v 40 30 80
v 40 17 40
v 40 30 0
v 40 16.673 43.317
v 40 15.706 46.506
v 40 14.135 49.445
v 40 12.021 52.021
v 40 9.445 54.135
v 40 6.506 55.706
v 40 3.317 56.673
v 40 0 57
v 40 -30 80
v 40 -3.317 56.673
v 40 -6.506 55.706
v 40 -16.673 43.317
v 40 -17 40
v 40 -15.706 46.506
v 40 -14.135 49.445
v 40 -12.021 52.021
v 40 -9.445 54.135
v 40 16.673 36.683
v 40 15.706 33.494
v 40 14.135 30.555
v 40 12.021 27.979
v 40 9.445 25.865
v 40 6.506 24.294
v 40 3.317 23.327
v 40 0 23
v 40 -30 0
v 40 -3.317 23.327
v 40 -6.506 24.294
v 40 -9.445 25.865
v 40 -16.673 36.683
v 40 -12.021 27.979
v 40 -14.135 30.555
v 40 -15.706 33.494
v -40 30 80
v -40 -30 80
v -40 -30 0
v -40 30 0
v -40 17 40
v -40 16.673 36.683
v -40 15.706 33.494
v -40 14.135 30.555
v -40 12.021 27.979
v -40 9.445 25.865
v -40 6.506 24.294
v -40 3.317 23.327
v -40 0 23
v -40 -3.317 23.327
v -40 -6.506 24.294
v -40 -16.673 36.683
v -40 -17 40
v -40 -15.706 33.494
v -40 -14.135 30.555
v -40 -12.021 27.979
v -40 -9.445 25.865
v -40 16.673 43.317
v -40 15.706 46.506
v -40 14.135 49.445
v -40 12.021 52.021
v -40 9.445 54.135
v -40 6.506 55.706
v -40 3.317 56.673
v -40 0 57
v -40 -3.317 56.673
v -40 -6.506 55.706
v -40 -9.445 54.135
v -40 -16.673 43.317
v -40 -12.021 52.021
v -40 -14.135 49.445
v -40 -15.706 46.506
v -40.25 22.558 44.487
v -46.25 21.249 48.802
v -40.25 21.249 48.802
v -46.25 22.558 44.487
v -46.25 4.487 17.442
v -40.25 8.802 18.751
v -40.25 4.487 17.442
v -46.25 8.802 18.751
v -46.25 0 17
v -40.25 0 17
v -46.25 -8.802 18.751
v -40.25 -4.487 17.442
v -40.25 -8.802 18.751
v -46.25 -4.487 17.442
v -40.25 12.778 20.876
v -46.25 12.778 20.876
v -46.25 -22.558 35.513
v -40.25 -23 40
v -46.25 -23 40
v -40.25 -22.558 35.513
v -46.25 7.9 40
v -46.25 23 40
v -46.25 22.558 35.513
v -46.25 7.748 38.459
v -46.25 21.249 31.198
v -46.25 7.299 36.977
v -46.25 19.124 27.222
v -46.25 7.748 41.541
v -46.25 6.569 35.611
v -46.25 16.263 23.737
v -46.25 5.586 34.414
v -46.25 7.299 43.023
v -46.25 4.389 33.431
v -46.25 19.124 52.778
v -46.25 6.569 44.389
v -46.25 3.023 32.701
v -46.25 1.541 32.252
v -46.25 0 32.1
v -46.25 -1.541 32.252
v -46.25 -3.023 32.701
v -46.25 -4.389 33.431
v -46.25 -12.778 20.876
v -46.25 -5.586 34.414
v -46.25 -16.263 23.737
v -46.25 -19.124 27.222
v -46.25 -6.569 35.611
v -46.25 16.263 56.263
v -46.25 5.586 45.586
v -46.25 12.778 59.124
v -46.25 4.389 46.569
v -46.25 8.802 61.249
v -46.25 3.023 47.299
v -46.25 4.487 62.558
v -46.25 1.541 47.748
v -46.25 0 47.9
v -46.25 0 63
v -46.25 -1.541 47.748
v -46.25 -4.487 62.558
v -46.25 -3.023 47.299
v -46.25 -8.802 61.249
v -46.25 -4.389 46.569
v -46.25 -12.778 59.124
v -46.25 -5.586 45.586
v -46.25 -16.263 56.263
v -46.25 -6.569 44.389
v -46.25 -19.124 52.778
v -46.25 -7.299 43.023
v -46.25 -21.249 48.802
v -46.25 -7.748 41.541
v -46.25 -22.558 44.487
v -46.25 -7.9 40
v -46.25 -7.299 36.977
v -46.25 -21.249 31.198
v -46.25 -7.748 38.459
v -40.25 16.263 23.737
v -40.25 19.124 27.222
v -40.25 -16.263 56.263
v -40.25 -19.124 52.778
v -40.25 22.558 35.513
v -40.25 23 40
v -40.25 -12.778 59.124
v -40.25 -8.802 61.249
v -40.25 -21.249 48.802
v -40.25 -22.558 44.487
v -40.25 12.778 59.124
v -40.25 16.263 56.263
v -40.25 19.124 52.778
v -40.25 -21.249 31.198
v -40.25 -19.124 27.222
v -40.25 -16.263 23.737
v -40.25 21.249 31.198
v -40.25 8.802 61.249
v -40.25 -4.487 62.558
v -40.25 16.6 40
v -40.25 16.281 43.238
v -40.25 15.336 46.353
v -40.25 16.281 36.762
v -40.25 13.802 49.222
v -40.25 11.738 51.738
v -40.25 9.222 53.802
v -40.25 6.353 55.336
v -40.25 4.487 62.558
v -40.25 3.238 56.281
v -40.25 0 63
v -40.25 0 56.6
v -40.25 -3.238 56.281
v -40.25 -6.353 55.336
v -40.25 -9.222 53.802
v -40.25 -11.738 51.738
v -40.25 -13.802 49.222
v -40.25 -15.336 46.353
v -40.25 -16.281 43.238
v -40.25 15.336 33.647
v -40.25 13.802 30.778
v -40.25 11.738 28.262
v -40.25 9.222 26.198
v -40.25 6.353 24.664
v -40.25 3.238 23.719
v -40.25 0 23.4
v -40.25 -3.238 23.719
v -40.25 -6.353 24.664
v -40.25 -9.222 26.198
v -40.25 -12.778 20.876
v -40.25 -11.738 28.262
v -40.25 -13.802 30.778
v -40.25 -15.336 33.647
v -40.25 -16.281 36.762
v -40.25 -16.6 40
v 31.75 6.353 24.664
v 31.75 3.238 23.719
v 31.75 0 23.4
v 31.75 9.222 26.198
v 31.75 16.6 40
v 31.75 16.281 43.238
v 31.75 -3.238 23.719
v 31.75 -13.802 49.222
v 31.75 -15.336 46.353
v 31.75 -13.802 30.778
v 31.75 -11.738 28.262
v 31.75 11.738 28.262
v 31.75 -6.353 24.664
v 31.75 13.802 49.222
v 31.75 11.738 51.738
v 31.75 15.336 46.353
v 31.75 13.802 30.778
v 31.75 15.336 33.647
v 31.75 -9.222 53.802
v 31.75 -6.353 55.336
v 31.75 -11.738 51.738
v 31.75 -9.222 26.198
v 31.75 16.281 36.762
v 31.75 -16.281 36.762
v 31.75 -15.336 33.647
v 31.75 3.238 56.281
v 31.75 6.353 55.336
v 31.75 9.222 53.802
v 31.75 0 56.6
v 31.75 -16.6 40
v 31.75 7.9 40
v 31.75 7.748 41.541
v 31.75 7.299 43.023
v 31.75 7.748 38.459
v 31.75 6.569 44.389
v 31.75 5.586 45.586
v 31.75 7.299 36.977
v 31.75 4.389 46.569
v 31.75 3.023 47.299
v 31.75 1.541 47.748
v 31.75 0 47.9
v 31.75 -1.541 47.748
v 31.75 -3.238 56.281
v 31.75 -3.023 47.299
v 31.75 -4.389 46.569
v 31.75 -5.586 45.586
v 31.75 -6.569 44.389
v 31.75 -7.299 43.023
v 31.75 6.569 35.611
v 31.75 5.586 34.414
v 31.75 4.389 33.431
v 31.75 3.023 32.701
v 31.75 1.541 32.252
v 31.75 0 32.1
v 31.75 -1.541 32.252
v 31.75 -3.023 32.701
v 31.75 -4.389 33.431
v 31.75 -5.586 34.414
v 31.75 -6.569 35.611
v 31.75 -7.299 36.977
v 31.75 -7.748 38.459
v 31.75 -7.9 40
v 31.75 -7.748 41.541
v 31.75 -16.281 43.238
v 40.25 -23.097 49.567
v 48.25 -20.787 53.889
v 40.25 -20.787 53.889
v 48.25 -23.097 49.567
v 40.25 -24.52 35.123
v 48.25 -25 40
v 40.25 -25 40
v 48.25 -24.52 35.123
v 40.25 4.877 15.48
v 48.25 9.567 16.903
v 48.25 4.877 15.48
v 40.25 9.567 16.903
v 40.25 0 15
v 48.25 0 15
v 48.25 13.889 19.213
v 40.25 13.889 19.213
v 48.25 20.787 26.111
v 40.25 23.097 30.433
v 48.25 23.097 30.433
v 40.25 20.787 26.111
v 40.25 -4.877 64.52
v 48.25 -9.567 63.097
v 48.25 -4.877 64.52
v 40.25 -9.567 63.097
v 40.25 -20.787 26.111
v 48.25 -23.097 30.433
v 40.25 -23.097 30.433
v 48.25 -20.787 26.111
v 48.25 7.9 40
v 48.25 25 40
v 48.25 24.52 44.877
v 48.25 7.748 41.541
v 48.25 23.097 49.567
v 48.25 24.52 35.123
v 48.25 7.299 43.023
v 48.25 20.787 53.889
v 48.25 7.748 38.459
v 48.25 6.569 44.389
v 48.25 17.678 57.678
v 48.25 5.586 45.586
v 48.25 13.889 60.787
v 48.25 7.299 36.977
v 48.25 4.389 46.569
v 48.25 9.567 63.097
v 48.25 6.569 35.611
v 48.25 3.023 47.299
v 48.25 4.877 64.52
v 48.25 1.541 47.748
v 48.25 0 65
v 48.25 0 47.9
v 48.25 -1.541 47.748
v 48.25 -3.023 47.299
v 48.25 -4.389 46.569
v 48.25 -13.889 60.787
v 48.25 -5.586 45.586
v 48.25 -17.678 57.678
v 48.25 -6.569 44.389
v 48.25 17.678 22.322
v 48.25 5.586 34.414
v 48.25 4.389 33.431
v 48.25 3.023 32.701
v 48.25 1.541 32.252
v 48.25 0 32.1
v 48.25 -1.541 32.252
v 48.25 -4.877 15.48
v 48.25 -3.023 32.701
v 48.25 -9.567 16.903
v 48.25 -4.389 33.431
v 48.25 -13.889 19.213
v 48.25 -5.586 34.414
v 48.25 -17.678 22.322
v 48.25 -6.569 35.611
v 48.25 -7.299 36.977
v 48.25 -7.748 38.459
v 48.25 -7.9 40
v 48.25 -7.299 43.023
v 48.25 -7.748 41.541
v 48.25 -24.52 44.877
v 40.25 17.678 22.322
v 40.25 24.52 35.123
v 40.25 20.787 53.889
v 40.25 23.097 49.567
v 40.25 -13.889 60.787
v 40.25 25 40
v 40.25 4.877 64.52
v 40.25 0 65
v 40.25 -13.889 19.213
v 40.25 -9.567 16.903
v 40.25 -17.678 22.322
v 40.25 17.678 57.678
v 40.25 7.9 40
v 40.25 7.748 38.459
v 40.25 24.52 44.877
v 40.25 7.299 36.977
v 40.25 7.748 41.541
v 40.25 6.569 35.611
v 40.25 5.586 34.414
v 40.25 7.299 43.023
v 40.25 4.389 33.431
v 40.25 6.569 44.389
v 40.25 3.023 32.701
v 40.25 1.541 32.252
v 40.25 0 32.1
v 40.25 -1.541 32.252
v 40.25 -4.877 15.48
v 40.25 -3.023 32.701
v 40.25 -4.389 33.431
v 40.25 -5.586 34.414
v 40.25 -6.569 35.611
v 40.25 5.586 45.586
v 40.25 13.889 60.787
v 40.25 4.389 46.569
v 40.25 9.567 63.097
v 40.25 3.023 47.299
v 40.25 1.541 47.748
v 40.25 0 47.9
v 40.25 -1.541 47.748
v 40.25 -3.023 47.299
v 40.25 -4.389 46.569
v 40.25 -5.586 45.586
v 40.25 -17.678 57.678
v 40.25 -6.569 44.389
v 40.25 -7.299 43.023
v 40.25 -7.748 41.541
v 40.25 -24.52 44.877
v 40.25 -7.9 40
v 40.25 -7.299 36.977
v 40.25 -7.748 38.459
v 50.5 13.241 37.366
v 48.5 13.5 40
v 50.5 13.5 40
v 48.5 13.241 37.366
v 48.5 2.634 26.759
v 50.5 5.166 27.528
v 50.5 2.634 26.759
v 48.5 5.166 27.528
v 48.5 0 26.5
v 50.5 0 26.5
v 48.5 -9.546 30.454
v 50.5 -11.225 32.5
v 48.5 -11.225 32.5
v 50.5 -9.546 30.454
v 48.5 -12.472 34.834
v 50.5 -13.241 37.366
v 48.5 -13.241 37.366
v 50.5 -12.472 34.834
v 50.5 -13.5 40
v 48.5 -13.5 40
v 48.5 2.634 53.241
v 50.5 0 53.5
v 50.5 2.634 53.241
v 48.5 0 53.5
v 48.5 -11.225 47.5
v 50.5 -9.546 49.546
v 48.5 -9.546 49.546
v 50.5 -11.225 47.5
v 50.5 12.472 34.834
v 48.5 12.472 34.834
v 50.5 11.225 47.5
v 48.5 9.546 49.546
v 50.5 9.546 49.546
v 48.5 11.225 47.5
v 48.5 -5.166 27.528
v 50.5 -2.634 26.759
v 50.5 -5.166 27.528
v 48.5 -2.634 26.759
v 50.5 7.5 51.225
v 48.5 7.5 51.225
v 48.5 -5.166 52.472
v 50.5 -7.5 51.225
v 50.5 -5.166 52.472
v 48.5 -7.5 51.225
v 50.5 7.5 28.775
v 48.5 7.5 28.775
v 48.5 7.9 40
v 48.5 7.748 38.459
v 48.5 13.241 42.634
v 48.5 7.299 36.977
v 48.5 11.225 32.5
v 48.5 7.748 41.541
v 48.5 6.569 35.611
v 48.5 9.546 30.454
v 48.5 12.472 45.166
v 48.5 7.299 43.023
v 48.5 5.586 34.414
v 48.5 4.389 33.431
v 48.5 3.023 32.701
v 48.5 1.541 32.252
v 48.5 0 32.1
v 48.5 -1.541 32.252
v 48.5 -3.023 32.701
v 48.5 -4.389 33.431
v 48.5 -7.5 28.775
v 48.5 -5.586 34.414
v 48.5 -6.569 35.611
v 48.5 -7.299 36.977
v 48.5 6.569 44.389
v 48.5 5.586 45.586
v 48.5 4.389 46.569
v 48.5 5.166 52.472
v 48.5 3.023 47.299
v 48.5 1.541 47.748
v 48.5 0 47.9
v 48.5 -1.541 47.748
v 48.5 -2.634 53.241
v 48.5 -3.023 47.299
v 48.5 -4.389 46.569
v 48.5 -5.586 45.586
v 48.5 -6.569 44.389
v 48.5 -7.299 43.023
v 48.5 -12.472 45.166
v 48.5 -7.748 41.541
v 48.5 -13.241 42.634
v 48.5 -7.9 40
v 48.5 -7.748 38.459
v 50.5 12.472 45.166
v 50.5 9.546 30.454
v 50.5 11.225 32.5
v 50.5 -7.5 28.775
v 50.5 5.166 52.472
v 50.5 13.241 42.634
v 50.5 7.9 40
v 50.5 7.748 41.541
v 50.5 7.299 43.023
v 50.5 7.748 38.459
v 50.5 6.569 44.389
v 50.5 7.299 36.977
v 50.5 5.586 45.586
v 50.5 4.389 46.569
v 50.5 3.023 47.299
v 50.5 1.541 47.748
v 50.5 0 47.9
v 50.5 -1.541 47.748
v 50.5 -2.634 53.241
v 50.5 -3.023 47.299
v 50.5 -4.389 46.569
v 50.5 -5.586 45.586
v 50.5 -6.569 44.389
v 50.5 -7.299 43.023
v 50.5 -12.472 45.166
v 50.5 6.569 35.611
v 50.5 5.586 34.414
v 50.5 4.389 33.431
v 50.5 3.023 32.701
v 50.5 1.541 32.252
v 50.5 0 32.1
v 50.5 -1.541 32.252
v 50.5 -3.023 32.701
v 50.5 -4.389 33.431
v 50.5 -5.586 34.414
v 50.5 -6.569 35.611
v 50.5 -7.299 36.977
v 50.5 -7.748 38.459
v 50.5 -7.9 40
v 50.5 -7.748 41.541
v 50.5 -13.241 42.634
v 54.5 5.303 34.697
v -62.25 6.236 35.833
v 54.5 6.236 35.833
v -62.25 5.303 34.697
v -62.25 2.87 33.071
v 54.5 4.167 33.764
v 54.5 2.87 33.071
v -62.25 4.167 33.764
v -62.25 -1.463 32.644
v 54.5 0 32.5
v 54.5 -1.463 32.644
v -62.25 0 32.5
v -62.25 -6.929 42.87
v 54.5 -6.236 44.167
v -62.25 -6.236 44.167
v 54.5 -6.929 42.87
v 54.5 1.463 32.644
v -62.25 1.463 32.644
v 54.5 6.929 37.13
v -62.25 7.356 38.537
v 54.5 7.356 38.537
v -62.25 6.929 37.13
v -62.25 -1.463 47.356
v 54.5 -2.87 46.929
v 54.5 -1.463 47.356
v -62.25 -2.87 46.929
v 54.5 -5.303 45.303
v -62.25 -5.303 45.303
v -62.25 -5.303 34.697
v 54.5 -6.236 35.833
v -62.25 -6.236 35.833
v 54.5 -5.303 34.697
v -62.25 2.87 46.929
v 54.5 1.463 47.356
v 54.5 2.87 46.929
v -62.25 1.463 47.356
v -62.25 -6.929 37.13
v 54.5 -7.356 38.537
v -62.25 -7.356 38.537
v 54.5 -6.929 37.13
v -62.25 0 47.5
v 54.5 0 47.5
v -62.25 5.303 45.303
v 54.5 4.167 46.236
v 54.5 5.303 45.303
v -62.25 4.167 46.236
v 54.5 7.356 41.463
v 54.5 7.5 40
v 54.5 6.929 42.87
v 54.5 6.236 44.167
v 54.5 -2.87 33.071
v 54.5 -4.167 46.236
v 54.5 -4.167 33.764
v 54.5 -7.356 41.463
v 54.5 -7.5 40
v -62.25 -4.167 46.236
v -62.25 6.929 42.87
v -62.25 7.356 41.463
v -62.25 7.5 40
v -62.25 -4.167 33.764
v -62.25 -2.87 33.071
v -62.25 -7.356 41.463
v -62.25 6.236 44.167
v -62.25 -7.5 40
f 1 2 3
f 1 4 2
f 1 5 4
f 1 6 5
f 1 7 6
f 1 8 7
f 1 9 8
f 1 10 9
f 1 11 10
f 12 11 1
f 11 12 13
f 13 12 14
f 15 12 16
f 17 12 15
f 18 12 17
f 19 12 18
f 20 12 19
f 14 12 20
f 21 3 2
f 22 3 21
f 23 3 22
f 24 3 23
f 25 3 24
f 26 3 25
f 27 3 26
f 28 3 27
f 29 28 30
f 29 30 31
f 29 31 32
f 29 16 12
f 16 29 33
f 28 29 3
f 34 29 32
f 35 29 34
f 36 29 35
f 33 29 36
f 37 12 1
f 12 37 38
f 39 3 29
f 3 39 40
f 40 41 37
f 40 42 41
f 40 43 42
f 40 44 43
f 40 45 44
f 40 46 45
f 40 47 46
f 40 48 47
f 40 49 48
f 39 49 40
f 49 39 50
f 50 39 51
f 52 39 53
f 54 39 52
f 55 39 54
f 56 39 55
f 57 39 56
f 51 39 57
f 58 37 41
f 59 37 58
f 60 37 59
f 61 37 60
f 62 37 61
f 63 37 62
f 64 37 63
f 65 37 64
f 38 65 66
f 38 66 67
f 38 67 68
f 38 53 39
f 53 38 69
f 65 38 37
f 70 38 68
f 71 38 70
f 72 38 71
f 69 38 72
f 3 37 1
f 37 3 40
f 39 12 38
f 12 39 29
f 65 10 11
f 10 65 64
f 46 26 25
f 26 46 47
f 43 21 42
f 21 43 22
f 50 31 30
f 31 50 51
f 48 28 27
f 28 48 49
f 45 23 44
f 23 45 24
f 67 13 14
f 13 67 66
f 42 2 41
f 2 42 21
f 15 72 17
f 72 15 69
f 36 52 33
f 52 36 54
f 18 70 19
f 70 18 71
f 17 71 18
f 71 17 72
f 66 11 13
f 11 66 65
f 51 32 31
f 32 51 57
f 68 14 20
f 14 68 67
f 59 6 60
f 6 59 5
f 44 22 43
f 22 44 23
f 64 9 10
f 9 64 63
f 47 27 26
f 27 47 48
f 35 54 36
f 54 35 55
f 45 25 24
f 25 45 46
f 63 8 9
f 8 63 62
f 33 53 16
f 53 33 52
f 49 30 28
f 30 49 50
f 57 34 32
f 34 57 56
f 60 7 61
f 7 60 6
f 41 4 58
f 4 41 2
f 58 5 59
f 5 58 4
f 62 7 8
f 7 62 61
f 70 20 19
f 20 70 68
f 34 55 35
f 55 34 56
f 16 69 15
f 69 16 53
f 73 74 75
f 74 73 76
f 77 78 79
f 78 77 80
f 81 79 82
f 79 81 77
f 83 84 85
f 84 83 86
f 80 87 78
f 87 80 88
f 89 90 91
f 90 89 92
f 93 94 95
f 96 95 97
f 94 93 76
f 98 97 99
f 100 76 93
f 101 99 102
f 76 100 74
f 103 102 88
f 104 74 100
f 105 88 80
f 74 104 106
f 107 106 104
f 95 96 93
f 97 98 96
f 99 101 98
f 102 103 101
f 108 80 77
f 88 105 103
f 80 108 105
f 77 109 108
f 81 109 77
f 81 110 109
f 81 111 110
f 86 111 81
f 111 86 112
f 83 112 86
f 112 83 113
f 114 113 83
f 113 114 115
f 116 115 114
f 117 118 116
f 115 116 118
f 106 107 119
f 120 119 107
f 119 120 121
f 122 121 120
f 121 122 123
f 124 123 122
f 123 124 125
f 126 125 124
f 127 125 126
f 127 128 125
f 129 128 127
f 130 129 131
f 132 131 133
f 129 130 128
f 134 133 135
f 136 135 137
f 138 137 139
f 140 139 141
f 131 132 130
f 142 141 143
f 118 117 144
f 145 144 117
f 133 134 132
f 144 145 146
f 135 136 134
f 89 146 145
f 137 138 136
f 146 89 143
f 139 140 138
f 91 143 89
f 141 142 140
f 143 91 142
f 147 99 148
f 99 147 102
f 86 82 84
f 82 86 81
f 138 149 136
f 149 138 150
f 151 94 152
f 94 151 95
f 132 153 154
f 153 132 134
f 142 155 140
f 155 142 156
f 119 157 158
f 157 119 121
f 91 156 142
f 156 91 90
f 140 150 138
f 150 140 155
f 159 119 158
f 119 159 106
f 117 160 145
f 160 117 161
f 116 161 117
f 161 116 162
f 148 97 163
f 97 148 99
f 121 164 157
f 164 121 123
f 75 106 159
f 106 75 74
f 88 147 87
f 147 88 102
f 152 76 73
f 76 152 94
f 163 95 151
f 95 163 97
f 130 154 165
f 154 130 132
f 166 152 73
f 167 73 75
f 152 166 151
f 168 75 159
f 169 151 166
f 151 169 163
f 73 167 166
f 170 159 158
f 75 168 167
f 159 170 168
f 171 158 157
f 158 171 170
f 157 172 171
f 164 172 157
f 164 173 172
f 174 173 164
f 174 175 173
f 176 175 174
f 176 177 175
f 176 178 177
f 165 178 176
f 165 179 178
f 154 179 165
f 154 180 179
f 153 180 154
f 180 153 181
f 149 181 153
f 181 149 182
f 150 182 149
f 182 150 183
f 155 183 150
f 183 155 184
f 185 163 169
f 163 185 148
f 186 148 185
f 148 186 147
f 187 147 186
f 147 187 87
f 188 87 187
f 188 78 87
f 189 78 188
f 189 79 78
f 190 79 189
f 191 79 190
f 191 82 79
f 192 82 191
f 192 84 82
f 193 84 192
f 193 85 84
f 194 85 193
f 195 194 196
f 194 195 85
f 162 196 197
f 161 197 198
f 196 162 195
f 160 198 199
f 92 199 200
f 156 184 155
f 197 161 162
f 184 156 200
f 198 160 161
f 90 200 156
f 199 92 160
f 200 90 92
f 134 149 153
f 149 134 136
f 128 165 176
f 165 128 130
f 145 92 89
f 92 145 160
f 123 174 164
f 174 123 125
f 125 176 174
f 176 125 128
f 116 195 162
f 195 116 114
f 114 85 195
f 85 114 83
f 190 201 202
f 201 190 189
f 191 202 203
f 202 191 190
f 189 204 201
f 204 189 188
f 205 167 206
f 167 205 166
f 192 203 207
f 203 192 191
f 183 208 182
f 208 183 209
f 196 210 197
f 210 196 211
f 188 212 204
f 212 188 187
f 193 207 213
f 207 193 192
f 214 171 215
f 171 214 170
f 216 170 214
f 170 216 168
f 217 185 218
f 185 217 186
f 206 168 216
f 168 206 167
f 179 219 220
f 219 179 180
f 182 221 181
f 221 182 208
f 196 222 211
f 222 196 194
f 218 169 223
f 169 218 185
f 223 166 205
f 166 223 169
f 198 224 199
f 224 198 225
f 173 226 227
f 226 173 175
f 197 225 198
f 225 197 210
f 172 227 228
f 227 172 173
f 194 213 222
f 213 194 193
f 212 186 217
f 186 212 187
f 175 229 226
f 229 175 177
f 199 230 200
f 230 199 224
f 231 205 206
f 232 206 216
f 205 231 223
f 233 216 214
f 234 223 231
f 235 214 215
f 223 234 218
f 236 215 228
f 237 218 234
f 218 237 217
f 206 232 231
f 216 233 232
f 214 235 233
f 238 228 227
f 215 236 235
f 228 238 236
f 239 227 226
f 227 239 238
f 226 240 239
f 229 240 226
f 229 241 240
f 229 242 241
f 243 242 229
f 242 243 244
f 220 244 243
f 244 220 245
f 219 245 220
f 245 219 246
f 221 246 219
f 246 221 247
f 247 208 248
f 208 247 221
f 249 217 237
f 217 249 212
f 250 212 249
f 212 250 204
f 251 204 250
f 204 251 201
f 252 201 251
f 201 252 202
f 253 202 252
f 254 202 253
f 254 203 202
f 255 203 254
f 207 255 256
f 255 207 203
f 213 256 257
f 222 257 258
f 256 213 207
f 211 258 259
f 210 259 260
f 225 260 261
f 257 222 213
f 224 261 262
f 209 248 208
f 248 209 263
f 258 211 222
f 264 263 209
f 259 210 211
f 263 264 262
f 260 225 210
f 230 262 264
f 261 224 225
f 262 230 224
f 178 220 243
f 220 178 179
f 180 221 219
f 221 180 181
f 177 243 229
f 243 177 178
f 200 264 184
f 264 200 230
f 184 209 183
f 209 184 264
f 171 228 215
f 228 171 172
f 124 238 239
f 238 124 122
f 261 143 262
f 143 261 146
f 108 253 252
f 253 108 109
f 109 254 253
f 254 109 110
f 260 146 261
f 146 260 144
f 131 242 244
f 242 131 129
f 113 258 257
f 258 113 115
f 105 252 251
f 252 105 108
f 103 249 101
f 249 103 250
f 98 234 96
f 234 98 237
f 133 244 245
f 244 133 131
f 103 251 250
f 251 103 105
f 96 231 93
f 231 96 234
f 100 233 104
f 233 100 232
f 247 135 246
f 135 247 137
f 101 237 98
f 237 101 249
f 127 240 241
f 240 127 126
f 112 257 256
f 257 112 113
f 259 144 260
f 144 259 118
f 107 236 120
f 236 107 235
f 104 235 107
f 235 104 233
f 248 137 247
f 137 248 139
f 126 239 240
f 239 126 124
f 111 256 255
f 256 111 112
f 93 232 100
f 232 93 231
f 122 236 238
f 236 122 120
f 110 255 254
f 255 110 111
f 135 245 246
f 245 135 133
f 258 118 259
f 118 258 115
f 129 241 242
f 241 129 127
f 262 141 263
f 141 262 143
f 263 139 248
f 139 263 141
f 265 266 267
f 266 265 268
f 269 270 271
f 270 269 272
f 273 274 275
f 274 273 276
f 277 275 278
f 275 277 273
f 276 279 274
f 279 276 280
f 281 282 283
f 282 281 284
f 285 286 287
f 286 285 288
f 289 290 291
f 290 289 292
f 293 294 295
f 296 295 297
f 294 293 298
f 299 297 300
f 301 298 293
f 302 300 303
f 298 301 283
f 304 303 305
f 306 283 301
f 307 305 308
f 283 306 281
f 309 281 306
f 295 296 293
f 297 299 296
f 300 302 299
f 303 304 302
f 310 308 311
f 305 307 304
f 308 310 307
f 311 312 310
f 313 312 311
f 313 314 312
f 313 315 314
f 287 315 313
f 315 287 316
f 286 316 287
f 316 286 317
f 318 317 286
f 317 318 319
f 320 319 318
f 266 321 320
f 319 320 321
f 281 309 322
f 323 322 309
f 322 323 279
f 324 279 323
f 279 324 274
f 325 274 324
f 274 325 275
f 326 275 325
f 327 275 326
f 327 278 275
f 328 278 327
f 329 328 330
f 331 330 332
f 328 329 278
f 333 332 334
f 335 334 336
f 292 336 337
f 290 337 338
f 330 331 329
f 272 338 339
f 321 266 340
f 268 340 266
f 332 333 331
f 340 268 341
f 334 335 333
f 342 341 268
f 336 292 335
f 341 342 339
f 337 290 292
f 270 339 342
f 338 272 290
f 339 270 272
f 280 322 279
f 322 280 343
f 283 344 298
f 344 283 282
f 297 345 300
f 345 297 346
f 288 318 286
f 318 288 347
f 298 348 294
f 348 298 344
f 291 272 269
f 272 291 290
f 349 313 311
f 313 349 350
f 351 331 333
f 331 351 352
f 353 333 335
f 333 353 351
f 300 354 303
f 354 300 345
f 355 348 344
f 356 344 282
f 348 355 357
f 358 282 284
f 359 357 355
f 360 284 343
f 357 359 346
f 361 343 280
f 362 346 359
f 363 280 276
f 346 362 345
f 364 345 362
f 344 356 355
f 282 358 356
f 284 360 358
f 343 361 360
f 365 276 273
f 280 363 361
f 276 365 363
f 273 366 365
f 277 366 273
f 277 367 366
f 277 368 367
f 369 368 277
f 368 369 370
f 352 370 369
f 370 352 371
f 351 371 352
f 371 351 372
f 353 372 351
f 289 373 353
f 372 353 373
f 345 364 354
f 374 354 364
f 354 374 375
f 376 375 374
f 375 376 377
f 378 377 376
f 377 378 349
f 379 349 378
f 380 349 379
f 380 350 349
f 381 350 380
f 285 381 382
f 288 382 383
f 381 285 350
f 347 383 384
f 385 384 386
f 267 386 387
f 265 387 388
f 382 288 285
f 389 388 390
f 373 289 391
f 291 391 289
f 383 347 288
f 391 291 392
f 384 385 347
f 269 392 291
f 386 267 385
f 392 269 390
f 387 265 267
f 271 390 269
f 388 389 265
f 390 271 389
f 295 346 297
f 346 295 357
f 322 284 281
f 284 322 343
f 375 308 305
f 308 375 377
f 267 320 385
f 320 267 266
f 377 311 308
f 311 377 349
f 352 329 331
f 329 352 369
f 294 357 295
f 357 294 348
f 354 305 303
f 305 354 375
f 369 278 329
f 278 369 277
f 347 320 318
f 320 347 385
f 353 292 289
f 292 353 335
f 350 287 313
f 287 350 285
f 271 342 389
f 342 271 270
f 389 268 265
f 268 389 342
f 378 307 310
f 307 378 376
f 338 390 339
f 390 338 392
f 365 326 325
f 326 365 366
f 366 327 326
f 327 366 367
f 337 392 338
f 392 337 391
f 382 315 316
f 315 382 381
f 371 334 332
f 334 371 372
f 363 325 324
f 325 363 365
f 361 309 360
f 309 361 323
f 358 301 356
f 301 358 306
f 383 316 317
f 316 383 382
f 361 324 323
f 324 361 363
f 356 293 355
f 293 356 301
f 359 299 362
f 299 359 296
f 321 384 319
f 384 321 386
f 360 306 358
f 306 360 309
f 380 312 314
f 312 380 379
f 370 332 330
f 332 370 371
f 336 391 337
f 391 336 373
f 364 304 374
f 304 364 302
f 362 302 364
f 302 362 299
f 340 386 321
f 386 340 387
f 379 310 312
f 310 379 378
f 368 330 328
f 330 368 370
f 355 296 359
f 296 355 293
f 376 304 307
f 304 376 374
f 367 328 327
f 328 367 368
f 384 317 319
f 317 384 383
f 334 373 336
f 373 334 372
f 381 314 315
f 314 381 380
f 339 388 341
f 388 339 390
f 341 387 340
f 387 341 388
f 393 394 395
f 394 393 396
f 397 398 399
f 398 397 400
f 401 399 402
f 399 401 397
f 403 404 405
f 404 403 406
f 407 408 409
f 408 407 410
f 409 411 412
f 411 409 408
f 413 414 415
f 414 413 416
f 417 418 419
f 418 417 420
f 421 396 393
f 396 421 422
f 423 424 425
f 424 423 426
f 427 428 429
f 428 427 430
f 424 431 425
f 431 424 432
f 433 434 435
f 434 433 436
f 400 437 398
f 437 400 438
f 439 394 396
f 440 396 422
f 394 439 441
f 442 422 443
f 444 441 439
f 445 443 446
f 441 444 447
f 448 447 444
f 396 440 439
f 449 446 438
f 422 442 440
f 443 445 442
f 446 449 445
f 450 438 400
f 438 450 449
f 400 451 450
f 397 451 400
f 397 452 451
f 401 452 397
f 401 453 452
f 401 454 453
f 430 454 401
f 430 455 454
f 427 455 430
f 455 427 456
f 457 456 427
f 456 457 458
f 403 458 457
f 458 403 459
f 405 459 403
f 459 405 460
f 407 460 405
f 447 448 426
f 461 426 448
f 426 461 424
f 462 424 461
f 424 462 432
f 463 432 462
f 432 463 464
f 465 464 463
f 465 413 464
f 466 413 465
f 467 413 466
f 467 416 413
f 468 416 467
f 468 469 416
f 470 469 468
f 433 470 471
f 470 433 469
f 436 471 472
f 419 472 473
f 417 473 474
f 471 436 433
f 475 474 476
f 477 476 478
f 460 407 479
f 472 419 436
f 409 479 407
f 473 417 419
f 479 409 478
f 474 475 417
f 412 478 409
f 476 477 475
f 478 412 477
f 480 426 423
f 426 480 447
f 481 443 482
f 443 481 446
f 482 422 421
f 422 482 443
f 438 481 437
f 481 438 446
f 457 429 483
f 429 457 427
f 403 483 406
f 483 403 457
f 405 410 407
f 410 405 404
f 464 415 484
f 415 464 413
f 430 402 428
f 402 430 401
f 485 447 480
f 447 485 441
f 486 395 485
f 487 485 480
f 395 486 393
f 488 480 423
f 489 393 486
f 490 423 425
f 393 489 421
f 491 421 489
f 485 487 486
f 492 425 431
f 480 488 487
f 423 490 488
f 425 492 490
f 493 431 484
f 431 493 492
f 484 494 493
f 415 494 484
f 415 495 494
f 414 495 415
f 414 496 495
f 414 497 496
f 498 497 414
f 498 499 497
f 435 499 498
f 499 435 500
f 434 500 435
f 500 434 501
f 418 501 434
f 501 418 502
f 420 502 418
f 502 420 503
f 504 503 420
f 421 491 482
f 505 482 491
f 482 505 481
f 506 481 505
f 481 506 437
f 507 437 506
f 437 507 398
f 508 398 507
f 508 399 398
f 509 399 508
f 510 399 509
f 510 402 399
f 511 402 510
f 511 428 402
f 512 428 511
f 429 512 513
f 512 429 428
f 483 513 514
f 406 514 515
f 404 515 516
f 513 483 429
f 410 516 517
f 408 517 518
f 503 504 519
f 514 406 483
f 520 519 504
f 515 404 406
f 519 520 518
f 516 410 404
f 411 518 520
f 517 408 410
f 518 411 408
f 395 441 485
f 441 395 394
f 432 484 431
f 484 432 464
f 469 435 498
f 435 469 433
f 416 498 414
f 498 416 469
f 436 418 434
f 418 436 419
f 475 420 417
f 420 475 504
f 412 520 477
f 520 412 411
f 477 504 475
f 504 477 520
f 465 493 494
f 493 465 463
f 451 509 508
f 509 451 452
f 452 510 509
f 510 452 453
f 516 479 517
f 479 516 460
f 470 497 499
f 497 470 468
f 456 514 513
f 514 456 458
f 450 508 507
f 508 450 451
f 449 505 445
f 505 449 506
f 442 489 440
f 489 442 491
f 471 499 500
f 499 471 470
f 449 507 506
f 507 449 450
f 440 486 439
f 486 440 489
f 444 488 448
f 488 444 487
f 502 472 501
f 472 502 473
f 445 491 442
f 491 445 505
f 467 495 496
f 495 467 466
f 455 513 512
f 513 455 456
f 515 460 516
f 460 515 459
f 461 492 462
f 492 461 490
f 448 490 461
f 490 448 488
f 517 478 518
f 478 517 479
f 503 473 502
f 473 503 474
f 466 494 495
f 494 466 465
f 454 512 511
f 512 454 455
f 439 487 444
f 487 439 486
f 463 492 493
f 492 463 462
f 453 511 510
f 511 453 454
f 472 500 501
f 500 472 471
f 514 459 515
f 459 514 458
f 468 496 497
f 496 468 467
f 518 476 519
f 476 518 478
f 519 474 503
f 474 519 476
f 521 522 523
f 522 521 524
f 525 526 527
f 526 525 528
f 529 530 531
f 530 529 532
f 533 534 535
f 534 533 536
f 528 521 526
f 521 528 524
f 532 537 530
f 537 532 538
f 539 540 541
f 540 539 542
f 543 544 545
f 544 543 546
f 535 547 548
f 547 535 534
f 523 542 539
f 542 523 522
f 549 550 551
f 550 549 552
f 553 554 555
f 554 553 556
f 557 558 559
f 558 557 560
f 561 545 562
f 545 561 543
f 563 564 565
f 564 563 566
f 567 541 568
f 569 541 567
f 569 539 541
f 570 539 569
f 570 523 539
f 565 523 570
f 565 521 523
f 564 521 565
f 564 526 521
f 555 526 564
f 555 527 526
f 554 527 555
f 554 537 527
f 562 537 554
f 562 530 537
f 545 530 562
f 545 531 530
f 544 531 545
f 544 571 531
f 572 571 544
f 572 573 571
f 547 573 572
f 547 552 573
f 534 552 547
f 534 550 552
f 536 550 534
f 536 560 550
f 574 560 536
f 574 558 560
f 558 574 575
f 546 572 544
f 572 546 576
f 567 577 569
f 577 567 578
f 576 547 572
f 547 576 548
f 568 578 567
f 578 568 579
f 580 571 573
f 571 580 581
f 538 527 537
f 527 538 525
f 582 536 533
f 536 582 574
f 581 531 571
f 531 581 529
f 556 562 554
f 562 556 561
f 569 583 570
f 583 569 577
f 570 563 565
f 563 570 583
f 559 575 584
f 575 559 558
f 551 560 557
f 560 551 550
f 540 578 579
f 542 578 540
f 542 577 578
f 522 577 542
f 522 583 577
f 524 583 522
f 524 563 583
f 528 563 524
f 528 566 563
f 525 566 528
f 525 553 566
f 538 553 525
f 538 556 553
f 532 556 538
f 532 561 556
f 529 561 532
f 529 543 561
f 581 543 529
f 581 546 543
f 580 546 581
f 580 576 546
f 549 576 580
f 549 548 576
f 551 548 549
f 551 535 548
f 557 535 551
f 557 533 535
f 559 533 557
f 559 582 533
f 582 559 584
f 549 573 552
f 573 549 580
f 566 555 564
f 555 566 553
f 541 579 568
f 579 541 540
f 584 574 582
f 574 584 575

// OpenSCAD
$fn = 32;

// ------------------------------------------------------------------------
// Bushed housing: 80 x 60 x 80 mm housing, bushing d33.2
// Every part is its own module, assembly() places them once.
// ------------------------------------------------------------------------

// --- part 1 ---
module housing() {
  difference() {
    translate([-40, -30, 0]) cube([80, 60, 80]);
    translate([0, 0, 40]) rotate([0, 90, 0]) cylinder(h = 82, d = 34, center = true);
  }
}

// --- part 2 ---
module bushing() {
  difference() {
    union() {
      cylinder(h = 6, d = 46);
      translate([0, 0, 6]) cylinder(h = 72, d = 33.2);
    }
    translate([0, 0, -1]) cylinder(h = 80, d = 15.8);
  }
}

// --- part 3 ---
module shaft() {
  translate([0, 0, -58.375]) cylinder(h = 116.75, d = 15);
}

// --- part 4 ---
module cover() {
  difference() {
    cylinder(h = 8, d = 50);
    translate([0, 0, -1]) cylinder(h = 10, d = 15.8);
  }
}

// --- part 5 ---
module washer() {
  difference() {
      translate([0, 0, 0]) cylinder(h = 2, d = 27);
      translate([0, 0, -1]) cylinder(h = 4, d = 15.8);
    }
}

// --- assembly ---
module assembly() {
  translate([0, 0, 0]) rotate([0, 0, 0]) housing();
  translate([-46.25, 0, 40]) rotate([0, 90, 0]) bushing();
  translate([-3.875, 0, 40]) rotate([0, 90, 0]) shaft();
  translate([40.25, 0, 40]) rotate([0, 90, 0]) cover();
  translate([48.5, 0, 40]) rotate([0, 90, 0]) washer();
}

assembly();
